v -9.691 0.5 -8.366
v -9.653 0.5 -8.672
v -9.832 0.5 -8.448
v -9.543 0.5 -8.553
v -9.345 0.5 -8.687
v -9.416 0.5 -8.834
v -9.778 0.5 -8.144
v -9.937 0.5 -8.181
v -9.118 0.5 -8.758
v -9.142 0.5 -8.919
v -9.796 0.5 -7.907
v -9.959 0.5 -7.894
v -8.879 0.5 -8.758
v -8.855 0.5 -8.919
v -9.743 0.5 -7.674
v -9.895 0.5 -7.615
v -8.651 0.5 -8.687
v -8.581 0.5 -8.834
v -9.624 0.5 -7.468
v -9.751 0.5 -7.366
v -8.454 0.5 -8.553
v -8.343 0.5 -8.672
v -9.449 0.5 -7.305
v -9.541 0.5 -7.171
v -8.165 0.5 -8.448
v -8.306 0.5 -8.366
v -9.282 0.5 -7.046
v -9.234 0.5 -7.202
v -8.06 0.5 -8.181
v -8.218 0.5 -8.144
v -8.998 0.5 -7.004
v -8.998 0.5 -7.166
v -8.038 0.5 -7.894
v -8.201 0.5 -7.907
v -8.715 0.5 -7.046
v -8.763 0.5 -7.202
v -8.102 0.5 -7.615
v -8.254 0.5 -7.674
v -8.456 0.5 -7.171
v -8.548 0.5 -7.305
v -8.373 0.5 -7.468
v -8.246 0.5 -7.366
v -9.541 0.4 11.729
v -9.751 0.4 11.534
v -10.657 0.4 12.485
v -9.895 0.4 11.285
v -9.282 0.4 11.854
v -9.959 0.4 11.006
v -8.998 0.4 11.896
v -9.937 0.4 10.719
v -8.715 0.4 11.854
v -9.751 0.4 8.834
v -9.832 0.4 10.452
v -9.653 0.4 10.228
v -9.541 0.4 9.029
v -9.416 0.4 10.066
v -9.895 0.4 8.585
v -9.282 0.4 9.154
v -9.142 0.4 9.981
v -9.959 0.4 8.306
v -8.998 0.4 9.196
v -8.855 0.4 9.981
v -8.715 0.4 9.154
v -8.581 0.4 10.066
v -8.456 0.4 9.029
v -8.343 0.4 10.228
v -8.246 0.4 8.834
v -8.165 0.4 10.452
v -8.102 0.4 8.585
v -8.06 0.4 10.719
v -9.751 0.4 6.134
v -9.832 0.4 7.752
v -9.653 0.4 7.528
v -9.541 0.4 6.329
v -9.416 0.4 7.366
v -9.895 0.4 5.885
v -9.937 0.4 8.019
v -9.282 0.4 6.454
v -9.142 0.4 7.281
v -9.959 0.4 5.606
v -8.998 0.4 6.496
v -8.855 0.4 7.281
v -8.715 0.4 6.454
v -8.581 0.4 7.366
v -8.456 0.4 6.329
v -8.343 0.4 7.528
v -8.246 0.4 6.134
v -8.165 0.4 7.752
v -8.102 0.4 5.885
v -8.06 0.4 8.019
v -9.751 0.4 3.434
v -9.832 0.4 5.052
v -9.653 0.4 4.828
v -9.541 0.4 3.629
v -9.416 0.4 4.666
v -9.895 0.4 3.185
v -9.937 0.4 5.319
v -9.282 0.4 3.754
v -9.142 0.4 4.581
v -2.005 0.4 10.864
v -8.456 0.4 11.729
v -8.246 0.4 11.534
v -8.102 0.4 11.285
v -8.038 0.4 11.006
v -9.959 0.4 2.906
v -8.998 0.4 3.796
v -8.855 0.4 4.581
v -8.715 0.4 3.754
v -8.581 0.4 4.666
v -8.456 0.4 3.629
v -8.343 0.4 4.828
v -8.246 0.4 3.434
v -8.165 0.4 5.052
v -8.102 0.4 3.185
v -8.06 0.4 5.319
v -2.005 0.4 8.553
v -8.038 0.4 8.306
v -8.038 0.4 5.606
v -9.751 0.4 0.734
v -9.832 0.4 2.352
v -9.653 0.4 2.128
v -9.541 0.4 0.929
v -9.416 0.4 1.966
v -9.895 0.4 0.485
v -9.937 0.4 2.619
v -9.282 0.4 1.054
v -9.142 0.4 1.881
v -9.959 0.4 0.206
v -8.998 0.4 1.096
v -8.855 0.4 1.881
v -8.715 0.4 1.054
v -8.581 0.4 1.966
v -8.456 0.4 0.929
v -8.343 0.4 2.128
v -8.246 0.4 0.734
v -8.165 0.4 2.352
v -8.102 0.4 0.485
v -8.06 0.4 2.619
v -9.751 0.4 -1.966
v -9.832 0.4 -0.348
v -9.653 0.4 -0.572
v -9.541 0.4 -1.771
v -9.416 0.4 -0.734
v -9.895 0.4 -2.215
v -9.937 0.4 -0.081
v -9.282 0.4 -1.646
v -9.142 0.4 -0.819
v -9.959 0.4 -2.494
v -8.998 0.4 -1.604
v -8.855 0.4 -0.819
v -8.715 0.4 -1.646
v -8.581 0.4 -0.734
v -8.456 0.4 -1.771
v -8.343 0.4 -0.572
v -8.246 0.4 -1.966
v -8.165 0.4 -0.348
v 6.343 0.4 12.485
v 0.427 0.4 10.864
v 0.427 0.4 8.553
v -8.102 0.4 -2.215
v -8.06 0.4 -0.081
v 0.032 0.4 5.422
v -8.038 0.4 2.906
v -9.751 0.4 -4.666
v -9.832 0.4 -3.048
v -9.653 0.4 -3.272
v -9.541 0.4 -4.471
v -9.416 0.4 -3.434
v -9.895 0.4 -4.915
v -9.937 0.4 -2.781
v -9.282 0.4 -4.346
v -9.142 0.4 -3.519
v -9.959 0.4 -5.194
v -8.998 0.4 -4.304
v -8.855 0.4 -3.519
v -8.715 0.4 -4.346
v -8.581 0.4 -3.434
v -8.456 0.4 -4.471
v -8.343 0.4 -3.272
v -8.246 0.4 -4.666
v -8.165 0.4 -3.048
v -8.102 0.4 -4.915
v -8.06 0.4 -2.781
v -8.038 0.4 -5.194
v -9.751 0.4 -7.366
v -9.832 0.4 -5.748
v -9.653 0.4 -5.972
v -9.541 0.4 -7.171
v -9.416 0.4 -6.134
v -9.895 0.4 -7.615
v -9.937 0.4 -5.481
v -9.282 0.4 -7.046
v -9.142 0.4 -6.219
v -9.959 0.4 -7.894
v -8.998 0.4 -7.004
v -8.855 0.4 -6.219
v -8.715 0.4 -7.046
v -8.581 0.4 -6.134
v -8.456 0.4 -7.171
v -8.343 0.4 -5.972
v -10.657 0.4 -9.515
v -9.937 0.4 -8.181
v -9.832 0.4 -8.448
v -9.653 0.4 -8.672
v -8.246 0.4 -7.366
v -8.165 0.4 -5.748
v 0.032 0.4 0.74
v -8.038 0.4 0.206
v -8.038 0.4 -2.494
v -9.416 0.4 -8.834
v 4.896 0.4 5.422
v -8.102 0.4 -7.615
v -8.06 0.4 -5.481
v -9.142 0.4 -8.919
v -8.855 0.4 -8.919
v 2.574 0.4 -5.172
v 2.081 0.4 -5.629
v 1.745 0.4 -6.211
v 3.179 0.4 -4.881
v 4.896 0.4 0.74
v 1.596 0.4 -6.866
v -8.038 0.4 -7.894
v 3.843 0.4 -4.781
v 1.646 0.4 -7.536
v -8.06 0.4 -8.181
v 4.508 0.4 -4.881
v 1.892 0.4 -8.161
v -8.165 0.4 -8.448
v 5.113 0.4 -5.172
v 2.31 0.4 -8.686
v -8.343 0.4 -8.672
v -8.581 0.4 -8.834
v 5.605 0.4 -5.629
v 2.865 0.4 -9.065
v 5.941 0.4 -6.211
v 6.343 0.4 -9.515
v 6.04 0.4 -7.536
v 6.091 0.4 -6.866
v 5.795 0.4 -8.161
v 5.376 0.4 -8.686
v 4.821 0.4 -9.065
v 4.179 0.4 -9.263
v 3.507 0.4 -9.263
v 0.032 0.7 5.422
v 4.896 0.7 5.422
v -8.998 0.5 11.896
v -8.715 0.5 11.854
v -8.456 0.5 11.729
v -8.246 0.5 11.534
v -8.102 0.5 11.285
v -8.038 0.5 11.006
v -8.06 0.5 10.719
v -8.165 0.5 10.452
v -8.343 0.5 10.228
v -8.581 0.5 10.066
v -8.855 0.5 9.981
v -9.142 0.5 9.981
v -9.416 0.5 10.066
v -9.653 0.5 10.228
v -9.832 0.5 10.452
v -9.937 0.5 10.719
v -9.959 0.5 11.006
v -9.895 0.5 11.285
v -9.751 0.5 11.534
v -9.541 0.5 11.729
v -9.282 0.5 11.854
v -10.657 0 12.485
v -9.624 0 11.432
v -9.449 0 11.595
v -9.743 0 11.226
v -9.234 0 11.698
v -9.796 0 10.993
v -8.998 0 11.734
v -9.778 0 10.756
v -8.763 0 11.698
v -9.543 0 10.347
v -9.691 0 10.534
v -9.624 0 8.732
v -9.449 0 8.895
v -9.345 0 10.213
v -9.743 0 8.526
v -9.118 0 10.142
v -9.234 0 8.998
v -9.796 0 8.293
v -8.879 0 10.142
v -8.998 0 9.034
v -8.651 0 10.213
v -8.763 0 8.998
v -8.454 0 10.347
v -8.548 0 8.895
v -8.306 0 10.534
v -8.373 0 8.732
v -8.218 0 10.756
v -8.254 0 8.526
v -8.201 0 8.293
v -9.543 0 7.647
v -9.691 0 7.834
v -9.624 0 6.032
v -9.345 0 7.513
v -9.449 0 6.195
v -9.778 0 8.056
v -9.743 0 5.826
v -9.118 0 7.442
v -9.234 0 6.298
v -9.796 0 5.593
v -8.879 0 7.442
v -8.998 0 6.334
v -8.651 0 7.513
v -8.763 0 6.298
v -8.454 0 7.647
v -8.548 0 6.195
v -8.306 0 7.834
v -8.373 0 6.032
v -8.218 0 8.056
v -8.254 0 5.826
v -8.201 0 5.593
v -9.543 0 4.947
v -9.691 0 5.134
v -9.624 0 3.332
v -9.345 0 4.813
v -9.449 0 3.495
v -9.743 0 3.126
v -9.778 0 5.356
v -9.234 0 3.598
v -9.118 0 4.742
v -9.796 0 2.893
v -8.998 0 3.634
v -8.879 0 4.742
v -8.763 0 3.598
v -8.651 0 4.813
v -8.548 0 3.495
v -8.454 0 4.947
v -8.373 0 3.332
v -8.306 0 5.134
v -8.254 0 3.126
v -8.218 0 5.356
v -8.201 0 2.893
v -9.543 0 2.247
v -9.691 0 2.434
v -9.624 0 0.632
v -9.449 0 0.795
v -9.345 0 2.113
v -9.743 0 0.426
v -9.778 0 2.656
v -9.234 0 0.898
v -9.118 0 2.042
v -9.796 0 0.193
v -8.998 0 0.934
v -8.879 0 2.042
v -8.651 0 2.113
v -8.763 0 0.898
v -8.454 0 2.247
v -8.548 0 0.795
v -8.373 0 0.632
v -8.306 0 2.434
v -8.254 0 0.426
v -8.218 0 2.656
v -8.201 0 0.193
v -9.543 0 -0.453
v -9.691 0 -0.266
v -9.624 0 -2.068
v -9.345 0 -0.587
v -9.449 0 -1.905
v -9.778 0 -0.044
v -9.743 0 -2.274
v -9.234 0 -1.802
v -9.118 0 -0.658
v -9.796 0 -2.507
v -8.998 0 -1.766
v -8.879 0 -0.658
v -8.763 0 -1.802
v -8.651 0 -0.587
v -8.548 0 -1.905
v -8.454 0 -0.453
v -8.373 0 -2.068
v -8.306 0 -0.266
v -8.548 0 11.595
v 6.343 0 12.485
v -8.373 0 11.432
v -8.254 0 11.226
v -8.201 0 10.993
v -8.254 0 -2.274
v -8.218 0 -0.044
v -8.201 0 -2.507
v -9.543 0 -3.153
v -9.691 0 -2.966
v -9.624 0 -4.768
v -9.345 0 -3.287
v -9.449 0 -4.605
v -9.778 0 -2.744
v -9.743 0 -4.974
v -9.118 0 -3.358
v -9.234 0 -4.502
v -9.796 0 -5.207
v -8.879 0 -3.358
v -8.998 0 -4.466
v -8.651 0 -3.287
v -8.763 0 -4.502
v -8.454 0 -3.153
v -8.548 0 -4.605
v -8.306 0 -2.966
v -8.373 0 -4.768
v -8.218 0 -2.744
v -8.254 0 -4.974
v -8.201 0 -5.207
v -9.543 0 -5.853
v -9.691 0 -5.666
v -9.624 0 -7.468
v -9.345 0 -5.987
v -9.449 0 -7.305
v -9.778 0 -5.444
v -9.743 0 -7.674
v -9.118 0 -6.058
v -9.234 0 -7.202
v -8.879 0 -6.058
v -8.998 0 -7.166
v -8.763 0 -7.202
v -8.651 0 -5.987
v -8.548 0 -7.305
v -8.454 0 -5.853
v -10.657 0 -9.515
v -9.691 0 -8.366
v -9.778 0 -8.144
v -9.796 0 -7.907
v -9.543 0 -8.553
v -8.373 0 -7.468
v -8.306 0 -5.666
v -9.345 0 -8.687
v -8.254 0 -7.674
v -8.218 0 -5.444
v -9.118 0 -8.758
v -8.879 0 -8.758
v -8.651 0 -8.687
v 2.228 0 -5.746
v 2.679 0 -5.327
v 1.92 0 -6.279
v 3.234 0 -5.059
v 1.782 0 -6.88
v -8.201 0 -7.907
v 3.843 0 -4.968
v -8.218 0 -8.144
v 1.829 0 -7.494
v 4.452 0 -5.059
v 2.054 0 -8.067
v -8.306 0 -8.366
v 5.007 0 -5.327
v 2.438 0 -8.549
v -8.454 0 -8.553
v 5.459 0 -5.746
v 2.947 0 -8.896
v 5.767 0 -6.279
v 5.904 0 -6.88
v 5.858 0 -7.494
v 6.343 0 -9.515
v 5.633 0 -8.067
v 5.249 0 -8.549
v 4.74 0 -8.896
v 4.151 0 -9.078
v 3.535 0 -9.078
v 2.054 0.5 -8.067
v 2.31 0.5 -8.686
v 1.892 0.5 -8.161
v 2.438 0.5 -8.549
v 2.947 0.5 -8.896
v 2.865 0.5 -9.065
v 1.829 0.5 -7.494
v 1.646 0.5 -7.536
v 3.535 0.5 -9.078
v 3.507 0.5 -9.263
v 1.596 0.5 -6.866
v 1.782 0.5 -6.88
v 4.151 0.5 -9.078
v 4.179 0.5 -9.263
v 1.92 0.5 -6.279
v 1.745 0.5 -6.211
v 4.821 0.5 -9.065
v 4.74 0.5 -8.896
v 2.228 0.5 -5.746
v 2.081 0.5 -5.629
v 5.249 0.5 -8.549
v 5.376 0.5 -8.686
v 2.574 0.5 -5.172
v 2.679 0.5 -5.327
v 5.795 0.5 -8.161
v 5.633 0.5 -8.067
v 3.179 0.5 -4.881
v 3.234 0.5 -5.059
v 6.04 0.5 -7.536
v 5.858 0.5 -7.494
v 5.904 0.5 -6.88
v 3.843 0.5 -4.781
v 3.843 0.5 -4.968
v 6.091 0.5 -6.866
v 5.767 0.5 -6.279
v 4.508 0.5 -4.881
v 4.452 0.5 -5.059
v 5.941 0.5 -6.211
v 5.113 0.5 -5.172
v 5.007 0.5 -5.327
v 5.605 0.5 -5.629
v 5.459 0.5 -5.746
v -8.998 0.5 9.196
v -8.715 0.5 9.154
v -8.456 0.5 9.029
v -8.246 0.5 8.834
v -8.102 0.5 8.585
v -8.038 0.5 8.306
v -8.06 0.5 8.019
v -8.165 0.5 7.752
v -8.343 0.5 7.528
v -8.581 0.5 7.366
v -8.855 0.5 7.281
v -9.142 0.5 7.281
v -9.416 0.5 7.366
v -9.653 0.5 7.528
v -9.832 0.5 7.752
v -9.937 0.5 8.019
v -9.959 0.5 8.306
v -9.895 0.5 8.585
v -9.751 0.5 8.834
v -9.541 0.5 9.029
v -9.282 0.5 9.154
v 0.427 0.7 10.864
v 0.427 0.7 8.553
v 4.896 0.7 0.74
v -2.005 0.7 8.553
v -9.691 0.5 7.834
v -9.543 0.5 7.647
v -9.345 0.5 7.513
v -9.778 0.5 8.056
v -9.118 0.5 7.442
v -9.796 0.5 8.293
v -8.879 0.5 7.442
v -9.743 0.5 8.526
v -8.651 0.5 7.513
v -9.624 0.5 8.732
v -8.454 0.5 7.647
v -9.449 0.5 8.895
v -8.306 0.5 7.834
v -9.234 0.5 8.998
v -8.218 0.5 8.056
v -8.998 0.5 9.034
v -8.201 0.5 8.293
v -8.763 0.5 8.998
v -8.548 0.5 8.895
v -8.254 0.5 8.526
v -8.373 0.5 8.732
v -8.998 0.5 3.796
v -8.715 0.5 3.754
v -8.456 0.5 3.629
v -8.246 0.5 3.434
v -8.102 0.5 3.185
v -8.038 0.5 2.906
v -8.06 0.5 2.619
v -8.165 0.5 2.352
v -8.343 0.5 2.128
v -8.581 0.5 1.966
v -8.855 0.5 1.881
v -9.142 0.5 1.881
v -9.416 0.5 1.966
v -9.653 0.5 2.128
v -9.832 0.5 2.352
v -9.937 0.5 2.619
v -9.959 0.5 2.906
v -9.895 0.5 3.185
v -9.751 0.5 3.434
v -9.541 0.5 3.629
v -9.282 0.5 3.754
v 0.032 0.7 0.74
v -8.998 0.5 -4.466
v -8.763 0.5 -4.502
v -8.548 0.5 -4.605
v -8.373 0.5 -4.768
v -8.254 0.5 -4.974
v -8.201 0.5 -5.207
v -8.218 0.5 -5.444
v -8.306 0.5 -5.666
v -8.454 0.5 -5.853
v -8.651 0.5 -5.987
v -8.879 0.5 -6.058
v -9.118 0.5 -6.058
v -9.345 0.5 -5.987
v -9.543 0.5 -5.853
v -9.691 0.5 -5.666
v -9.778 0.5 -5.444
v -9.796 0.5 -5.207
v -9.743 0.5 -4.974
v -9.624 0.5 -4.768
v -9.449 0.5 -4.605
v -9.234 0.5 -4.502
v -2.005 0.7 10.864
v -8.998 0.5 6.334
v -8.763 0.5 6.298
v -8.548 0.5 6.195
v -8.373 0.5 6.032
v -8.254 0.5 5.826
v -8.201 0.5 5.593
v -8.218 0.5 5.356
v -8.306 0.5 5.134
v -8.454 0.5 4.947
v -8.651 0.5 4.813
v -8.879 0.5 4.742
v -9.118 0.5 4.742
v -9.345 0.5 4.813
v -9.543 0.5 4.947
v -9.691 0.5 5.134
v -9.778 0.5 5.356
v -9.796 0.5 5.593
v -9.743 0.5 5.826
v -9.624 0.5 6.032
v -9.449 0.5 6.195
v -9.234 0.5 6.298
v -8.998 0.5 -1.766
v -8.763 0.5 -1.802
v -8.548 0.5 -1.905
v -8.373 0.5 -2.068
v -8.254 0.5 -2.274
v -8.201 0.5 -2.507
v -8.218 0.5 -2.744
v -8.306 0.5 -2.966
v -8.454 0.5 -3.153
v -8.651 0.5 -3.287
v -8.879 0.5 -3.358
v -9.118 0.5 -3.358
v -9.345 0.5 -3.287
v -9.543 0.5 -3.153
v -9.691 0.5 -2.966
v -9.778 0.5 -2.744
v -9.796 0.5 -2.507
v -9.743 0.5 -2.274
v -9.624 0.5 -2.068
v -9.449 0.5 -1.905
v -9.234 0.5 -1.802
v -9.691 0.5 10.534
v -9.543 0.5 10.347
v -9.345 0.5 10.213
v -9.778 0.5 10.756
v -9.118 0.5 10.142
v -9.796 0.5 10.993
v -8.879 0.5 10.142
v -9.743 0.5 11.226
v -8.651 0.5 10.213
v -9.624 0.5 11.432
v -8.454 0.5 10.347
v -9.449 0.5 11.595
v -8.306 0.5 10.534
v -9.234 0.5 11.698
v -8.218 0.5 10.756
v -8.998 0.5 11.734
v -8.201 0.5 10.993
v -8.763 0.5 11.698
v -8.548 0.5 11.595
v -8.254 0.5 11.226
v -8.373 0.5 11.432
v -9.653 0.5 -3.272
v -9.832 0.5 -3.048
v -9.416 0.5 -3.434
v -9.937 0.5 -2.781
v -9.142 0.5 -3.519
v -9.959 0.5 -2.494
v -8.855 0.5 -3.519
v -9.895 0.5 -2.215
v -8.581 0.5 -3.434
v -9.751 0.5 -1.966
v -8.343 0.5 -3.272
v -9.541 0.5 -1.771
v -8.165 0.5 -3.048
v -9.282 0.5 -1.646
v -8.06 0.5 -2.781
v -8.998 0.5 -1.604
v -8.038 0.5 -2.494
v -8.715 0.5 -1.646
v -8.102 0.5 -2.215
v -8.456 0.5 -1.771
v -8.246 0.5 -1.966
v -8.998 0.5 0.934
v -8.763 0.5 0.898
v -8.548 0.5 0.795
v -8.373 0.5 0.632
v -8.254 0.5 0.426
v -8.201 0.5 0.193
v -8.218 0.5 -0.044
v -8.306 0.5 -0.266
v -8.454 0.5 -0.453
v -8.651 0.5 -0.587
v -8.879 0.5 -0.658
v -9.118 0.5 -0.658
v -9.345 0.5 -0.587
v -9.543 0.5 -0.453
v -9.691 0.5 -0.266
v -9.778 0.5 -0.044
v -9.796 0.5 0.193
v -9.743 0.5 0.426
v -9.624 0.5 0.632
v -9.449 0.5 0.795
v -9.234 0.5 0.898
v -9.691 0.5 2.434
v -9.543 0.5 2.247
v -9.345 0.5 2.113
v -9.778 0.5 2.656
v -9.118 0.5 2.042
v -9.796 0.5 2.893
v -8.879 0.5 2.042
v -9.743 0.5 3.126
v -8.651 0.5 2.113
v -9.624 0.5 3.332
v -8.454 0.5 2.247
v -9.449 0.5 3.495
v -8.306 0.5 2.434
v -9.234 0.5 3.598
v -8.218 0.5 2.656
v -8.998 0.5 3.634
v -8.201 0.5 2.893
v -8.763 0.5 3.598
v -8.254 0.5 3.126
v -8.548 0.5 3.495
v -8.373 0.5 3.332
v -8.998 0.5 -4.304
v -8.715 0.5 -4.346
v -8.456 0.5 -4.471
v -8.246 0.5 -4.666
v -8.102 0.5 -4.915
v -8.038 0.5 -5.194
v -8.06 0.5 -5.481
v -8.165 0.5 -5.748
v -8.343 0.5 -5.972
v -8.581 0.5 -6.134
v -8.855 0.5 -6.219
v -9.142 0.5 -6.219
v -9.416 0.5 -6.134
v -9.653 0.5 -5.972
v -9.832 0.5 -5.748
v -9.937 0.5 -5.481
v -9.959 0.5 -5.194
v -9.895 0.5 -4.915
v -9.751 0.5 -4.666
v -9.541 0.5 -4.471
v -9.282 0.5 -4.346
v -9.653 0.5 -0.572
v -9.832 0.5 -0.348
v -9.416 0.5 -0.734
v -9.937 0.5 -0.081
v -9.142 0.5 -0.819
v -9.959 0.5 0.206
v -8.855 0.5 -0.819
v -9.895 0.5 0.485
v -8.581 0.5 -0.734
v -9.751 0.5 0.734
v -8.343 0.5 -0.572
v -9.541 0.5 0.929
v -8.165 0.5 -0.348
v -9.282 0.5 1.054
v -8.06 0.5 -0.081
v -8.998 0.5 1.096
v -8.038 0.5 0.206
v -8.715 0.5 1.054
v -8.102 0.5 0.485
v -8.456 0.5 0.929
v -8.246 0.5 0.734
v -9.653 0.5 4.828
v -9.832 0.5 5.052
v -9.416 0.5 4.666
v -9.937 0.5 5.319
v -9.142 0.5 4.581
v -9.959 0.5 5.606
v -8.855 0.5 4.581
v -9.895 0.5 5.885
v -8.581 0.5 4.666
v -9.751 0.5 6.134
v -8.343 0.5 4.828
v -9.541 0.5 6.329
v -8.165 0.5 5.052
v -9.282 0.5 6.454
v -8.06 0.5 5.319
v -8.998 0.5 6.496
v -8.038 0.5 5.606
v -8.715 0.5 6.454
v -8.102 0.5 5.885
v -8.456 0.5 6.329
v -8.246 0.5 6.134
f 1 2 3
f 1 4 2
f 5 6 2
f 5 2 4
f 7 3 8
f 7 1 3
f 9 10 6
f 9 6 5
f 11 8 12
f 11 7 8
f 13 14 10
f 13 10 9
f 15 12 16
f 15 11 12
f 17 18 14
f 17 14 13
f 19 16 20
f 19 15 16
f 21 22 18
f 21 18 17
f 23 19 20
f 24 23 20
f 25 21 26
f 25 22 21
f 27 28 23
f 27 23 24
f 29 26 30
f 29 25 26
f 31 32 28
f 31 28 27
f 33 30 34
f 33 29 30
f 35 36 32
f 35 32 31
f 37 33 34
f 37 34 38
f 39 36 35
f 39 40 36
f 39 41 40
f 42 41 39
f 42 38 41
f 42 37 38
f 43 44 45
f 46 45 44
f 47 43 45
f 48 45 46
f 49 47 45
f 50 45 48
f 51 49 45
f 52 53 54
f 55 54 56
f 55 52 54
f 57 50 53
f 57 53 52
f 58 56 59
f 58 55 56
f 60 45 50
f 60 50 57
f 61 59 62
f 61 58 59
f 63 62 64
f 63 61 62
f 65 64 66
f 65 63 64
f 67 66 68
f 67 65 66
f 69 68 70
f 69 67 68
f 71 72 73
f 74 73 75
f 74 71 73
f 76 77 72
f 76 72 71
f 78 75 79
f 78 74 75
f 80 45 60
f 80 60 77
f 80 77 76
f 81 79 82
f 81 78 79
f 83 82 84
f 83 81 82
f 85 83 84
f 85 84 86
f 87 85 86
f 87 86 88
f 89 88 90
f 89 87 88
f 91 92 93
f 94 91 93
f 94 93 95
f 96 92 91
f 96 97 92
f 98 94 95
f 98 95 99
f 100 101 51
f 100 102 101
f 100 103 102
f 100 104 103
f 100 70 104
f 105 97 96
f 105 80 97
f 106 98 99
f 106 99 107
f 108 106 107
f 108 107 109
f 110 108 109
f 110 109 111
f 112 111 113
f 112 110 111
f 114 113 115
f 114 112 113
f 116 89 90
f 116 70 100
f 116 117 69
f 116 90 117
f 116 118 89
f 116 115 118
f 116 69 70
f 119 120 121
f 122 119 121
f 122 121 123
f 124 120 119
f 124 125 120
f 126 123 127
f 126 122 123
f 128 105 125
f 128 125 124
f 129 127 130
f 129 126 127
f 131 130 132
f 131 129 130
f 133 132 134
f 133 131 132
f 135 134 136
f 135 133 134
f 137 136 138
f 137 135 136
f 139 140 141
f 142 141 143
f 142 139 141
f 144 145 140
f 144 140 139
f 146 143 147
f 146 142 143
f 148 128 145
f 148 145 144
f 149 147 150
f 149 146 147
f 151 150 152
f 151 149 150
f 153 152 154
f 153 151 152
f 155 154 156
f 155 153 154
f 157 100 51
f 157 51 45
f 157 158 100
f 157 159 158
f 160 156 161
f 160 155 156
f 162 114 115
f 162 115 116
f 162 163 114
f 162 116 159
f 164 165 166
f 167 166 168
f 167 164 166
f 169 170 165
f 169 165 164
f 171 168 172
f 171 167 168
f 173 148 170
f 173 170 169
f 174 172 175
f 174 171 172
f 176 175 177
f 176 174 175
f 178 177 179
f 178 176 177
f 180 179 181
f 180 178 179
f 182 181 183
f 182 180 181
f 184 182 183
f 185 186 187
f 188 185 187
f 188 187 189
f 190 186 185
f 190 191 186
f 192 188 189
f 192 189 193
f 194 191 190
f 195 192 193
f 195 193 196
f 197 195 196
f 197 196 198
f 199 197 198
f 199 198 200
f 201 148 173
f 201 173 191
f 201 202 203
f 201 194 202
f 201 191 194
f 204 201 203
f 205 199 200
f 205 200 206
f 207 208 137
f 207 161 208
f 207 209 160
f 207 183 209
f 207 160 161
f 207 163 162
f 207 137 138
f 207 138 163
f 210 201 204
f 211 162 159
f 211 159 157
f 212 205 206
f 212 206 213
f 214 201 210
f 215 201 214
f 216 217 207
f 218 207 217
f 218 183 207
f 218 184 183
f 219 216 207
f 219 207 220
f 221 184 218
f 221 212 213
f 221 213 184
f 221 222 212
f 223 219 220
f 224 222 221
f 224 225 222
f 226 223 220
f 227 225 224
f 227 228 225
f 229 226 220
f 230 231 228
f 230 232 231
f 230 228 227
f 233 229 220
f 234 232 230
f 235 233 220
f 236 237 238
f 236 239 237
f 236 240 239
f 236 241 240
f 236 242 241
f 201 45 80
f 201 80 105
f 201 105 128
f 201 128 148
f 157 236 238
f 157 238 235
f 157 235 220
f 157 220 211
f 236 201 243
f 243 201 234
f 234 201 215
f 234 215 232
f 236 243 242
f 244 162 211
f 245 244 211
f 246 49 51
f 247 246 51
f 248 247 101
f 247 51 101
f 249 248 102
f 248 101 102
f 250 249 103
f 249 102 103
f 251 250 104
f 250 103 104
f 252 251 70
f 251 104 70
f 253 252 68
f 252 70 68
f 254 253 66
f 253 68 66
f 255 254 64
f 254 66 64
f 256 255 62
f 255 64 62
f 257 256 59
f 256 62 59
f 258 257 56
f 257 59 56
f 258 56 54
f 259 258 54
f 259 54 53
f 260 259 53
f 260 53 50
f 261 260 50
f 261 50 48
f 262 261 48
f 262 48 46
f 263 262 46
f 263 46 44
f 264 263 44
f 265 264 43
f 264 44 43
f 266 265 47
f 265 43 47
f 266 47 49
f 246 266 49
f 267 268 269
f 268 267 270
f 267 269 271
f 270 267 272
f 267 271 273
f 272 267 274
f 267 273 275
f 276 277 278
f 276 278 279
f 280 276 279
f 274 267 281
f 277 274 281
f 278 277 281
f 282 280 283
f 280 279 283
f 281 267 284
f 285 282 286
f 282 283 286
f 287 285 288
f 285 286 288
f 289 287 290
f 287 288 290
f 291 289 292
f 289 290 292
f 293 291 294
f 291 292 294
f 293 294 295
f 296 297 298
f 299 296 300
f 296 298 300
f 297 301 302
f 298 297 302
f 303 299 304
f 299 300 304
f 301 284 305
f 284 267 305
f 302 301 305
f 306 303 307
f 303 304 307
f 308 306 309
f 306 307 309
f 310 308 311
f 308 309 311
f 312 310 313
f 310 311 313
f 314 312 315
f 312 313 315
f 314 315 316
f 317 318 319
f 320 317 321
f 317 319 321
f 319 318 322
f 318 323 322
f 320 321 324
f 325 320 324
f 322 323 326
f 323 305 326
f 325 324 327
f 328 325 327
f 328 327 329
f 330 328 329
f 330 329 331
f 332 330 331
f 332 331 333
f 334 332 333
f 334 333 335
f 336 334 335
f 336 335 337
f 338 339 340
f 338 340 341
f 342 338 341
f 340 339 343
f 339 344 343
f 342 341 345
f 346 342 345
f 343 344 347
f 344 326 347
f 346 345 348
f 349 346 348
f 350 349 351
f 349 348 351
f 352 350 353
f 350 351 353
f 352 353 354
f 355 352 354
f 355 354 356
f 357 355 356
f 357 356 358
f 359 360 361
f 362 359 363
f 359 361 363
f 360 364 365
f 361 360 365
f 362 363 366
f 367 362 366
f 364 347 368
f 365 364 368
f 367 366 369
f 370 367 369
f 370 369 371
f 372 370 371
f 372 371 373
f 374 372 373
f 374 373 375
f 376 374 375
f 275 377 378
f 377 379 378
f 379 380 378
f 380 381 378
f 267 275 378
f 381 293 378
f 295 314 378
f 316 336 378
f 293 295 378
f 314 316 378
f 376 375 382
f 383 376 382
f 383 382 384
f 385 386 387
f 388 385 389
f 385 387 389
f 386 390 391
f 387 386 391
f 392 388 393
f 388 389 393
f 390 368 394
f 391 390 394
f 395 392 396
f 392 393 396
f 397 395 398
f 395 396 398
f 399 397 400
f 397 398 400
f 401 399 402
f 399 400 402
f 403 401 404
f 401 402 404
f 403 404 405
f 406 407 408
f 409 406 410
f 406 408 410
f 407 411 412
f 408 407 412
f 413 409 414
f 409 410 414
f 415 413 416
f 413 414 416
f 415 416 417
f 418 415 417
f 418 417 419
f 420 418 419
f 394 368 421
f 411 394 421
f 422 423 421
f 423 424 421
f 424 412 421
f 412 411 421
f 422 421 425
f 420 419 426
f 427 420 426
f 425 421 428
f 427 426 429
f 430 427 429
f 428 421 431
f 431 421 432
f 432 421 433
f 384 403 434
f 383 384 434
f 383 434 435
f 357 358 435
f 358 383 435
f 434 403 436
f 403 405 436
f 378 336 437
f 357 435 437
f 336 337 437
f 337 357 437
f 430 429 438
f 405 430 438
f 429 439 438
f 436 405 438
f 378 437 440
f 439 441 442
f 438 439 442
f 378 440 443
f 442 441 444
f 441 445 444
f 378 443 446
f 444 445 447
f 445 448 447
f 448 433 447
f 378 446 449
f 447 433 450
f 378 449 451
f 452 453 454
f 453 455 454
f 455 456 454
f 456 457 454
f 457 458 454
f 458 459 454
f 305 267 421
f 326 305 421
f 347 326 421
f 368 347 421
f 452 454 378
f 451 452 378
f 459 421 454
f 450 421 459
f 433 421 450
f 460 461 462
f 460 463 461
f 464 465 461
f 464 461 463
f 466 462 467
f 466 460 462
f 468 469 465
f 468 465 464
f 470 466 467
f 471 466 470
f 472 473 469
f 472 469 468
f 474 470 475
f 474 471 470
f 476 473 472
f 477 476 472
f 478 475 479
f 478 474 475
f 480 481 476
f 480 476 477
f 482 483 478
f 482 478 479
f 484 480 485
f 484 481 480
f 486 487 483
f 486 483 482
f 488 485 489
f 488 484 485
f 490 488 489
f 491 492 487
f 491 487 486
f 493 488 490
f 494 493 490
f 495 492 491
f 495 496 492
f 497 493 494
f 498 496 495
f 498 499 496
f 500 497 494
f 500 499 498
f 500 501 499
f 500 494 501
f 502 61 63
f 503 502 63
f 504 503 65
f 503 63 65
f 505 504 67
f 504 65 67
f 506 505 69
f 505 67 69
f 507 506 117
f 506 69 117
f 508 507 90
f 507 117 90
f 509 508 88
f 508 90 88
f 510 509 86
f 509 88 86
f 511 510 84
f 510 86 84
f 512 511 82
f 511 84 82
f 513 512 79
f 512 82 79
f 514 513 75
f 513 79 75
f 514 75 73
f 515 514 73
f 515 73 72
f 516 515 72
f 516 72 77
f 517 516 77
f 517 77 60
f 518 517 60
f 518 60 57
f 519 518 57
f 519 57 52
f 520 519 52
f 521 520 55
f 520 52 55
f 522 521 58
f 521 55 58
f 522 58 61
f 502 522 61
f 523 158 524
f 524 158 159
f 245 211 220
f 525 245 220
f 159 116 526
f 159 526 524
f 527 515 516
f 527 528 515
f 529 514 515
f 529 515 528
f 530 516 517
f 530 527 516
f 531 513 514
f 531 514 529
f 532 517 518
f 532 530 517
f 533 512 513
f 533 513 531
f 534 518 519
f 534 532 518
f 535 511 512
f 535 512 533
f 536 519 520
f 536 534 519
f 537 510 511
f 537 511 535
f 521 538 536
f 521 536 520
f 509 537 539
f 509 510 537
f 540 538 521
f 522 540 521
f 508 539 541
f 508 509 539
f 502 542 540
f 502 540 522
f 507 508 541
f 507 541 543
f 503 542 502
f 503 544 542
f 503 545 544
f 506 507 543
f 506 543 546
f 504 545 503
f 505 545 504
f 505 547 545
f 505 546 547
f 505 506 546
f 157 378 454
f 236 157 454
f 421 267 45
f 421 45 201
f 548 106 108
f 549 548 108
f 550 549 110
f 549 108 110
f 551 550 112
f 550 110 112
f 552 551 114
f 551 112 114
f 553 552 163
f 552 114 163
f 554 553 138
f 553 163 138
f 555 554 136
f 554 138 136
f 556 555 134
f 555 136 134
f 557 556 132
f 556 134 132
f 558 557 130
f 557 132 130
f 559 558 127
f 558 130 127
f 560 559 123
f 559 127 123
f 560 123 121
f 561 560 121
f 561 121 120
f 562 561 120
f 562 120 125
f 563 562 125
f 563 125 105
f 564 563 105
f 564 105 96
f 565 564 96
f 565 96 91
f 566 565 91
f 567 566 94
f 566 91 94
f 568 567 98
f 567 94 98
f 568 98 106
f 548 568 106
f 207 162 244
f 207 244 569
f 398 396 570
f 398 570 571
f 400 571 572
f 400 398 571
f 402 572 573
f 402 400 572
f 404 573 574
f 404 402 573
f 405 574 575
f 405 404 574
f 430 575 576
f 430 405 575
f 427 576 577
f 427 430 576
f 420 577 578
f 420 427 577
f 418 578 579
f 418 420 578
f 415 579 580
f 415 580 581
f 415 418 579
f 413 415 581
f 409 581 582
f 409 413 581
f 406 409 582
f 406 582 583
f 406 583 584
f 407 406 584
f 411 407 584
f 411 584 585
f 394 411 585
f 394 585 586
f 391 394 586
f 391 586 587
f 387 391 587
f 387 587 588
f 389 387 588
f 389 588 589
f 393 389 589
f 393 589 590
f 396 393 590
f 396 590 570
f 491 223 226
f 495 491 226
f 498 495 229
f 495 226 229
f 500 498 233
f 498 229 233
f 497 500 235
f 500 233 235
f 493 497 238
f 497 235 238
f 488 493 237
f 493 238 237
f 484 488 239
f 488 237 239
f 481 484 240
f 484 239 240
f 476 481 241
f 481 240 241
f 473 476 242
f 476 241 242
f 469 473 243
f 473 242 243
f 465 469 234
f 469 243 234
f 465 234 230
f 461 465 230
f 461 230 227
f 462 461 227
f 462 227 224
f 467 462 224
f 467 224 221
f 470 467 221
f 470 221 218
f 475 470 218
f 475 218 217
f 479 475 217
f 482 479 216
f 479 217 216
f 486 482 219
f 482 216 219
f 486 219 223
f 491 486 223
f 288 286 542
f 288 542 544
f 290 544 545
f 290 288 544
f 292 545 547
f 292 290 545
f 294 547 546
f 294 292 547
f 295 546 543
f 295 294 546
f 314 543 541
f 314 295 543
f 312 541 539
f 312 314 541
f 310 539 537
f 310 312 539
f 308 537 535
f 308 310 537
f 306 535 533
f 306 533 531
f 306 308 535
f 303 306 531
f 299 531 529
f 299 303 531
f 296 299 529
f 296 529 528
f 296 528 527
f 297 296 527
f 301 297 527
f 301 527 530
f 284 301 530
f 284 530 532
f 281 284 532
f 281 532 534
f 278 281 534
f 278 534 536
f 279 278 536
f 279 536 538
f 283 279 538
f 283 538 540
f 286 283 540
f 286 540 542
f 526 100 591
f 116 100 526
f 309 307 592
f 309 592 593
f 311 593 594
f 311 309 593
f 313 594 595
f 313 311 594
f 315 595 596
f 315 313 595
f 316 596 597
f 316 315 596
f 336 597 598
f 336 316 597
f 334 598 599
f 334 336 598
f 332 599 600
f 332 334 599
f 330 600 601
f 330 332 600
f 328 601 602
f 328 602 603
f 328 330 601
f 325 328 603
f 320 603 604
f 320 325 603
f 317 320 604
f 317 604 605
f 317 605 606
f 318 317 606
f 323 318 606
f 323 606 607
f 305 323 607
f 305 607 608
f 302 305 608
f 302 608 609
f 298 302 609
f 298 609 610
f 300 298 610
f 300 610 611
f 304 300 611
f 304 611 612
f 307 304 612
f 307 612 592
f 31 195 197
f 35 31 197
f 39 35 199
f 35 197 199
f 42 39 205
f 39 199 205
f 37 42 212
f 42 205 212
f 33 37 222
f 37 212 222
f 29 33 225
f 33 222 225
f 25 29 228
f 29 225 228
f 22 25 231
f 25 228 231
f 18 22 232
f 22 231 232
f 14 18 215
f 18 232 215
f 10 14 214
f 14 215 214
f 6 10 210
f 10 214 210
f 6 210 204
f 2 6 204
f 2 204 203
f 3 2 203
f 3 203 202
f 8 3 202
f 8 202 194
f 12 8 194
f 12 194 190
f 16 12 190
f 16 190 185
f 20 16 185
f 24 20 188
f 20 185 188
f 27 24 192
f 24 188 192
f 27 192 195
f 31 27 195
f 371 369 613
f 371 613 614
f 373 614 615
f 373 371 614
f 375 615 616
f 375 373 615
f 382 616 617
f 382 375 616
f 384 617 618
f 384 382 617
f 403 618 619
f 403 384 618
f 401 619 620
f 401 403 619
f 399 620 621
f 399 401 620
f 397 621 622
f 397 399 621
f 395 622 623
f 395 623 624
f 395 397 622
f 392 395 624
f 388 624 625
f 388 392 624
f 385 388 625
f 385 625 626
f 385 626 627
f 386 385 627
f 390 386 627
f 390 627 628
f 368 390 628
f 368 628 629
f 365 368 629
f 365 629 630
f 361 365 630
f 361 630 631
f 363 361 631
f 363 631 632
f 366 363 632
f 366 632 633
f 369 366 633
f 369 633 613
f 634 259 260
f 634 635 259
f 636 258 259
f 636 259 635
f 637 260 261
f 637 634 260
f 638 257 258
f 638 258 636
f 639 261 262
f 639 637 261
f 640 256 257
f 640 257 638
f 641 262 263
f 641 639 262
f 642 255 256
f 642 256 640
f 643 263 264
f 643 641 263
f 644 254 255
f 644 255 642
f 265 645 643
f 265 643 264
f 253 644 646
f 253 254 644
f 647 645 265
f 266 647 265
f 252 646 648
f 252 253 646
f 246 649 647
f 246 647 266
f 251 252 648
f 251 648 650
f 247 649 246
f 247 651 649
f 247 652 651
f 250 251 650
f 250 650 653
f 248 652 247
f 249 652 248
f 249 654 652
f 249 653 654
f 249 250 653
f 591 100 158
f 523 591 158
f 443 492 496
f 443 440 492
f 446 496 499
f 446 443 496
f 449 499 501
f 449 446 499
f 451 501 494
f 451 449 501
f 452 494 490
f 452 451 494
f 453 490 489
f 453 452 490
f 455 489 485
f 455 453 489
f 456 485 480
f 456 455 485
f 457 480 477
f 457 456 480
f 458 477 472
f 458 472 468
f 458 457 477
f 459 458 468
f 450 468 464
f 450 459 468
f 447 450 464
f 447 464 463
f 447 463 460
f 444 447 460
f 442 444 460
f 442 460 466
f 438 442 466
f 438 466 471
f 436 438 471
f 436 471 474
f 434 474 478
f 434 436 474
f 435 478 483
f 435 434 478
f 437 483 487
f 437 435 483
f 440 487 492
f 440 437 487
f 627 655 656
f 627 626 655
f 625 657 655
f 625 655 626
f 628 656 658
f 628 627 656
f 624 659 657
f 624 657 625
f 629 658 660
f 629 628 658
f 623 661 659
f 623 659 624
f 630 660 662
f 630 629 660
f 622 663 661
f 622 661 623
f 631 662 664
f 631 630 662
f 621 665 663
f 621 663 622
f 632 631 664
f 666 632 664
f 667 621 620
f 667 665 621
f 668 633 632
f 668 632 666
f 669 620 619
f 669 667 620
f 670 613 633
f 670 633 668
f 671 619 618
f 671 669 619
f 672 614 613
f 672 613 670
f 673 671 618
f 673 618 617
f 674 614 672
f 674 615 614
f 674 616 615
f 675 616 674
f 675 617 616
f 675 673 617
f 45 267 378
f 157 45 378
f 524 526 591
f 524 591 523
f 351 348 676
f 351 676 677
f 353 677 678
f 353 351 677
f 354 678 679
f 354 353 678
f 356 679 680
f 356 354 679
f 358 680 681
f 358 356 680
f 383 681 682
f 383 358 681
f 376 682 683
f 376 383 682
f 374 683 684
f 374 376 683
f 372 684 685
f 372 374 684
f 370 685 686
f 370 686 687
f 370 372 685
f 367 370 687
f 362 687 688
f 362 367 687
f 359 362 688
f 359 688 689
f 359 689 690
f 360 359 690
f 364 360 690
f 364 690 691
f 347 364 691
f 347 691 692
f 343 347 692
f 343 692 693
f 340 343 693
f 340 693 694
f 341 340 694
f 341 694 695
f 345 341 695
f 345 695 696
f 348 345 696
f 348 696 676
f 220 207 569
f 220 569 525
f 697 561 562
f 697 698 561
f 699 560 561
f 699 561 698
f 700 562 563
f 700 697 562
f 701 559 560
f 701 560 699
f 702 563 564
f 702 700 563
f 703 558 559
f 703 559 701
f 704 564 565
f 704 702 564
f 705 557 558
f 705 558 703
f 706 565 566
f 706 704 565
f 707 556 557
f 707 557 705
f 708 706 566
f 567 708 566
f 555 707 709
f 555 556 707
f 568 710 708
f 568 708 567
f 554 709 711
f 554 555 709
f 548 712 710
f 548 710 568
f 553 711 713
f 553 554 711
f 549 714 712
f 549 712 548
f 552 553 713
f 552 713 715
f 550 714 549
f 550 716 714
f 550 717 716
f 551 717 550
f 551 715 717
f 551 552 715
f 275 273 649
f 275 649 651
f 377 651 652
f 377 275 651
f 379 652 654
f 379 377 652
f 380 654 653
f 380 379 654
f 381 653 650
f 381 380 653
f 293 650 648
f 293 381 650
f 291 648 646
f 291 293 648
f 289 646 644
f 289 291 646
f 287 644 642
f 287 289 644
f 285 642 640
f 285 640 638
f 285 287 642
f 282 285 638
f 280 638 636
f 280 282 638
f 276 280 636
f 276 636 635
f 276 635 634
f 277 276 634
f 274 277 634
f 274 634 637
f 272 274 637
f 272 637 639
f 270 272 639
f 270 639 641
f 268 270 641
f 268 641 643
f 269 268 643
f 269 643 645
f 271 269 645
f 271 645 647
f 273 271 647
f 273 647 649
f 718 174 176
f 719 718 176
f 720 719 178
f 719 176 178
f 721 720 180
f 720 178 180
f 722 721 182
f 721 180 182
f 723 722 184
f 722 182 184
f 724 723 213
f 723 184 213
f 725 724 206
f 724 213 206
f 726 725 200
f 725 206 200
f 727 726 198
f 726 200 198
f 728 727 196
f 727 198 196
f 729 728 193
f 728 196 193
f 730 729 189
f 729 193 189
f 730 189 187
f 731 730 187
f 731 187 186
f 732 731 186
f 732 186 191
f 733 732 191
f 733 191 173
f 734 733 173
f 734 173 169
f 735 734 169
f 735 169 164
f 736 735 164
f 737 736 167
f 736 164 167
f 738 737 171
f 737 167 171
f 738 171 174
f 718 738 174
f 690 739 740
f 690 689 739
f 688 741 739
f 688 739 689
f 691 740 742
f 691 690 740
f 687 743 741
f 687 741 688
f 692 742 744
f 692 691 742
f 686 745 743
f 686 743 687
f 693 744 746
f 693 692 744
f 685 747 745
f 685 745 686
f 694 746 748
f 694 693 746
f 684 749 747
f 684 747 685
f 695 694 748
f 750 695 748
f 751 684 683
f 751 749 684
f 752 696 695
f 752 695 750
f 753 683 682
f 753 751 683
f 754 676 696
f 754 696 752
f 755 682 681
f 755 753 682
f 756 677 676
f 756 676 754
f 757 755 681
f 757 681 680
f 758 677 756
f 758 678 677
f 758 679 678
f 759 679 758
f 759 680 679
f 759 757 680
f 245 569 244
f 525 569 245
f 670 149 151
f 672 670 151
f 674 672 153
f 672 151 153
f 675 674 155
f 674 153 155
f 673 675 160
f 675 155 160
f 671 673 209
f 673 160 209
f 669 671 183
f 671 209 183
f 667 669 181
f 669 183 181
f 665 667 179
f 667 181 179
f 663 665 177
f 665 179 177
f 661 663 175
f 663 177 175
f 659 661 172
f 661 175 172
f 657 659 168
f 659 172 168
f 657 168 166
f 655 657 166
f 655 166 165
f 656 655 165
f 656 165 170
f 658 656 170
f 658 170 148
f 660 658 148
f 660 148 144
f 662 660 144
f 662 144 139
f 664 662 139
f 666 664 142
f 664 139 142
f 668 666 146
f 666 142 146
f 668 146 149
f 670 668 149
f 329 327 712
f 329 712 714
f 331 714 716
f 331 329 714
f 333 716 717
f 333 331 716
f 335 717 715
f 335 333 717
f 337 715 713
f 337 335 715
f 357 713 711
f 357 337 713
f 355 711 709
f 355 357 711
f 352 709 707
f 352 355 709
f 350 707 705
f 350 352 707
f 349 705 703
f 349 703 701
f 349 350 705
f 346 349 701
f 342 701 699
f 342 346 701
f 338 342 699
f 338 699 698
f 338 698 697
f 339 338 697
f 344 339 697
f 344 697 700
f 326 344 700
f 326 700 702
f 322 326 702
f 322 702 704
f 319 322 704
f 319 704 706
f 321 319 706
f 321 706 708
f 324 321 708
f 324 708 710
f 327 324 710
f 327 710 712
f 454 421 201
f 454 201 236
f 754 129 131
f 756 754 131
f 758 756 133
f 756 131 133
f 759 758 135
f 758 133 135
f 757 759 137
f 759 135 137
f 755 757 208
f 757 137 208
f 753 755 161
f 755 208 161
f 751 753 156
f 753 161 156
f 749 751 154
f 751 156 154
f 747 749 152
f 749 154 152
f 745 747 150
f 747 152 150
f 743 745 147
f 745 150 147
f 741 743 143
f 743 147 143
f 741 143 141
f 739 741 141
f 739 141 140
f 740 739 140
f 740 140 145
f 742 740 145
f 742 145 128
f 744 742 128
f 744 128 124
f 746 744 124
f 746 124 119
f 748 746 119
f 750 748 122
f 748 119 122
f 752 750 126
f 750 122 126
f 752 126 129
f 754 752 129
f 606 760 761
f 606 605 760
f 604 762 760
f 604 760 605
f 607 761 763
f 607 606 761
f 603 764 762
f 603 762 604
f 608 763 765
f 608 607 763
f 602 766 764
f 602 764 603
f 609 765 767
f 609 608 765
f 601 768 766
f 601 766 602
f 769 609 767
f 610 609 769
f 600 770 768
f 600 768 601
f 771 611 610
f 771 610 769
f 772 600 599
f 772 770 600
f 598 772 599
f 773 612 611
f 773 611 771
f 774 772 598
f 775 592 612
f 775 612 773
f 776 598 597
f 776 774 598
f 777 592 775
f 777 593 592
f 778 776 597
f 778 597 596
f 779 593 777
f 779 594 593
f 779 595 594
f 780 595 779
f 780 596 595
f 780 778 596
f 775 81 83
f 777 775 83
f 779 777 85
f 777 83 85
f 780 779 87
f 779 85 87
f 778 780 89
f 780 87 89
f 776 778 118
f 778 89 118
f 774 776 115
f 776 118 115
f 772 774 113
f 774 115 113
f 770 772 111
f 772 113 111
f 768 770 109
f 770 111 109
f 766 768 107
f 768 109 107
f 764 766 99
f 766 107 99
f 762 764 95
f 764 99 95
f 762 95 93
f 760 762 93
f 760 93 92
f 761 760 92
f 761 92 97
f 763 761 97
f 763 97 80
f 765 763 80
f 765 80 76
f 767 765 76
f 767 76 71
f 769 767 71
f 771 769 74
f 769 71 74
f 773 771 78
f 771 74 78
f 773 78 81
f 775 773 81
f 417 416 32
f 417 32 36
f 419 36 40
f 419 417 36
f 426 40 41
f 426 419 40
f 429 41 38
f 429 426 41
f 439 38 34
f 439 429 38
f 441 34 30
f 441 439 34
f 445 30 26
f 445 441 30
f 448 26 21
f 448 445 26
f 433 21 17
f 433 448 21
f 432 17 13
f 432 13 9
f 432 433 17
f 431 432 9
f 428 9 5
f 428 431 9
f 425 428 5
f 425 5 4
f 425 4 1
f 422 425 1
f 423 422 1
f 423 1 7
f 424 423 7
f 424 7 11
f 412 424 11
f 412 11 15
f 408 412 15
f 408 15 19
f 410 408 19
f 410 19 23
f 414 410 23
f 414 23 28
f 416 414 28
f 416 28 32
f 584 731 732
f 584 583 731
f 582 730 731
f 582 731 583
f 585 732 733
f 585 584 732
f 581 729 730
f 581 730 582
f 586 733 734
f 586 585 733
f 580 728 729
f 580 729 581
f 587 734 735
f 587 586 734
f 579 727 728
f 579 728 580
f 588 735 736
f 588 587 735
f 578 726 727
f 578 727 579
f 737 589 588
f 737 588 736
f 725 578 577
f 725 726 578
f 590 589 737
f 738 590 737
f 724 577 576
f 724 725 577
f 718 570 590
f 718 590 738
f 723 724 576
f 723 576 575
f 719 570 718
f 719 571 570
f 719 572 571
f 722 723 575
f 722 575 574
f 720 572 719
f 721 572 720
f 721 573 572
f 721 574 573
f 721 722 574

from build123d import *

# Parameters (mm, degrees)
SKETCH1_W           = 17
SKETCH1_H           = 22
SKETCH1_R           = 2.066566425
SKETCH1_R_2         = 0.8
BOSS_EXTRUDE2_DEPTH = 0.4
SKETCH3_R           = 2.253615782
SKETCH3_R_2         = 2.066566425
SKETCH3_R_3         = 0.962856641
SKETCH3_R_4         = 0.8
BOSS_EXTRUDE3_DEPTH = 0.1
SKETCH4_W           = 2.432070337
SKETCH4_H           = 2.310466819
SKETCH4_W_2         = 4.864140673
SKETCH4_H_2         = 4.681735398
BOSS_EXTRUDE4_DEPTH = 0.3


with BuildPart() as part:
    # Sketch1 → Boss-Extrude2 (new body)
    with BuildSketch(Plane(origin=(0, 0, 0), x_dir=(1, 0, 0), z_dir=(0, 1, 0))):
        with Locations((-2.156716418, -1.485074627)):
            Rectangle(SKETCH1_W, SKETCH1_H)
        with Locations(Location((3.843283582, 7.034200162, 0), (0, 0, 270))):
            Circle(SKETCH1_R, mode=Mode.SUBTRACT)
        with Locations(Location((-8.998366841, 7.966442948, 0), (0, 0, 270))):
            Circle(SKETCH1_R_2, mode=Mode.SUBTRACT)
        with Locations(Location((-8.998366841, 5.266442948, 0), (0, 0, 270))):
            Circle(SKETCH1_R_2, mode=Mode.SUBTRACT)
        with Locations(Location((-8.998366841, 2.566442948, 0), (0, 0, 270))):
            Circle(SKETCH1_R_2, mode=Mode.SUBTRACT)
        with Locations(Location((-8.998366841, -0.133557052, 0), (0, 0, 270))):
            Circle(SKETCH1_R_2, mode=Mode.SUBTRACT)
        with Locations(Location((-8.998366841, -2.833557052, 0), (0, 0, 270))):
            Circle(SKETCH1_R_2, mode=Mode.SUBTRACT)
        with Locations(Location((-8.998366841, -5.533557052, 0), (0, 0, 270))):
            Circle(SKETCH1_R_2, mode=Mode.SUBTRACT)
        with Locations(Location((-8.998366841, -8.233557052, 0), (0, 0, 270))):
            Circle(SKETCH1_R_2, mode=Mode.SUBTRACT)
        with Locations(Location((-8.998366841, -10.933557052, 0), (0, 0, 270))):
            Circle(SKETCH1_R_2, mode=Mode.SUBTRACT)
    extrude(amount=BOSS_EXTRUDE2_DEPTH)

    # Sketch3 → Boss-Extrude3 (add)
    # profile 1 of 9: a face of its own
    with BuildSketch(Plane(origin=(0, 0.4, 0), x_dir=(1, 0, 0), z_dir=(0, 1, 0))):
        with Locations(Location((3.843283582, 7.034200162, 0), (0, 0, 270))):
            Circle(SKETCH3_R)
        with Locations(Location((3.843283582, 7.034200162, 0), (0, 0, 270))):
            Circle(SKETCH3_R_2, mode=Mode.SUBTRACT)
    # profile 2 of 9: a face of its own
    with BuildSketch(Plane(origin=(0, 0.4, 0), x_dir=(1, 0, 0), z_dir=(0, 1, 0))):
        with Locations(Location((-8.998366841, 7.966442948, 0), (0, 0, 270))):
            Circle(SKETCH3_R_3)
        with Locations(Location((-8.998366841, 7.966442948, 0), (0, 0, 270))):
            Circle(SKETCH3_R_4, mode=Mode.SUBTRACT)
    # profile 3 of 9: a face of its own
    with BuildSketch(Plane(origin=(0, 0.4, 0), x_dir=(1, 0, 0), z_dir=(0, 1, 0))):
        with Locations(Location((-8.998366841, 5.266442948, 0), (0, 0, 270))):
            Circle(SKETCH3_R_3)
        with Locations(Location((-8.998366841, 5.266442948, 0), (0, 0, 270))):
            Circle(SKETCH3_R_4, mode=Mode.SUBTRACT)
    # profile 4 of 9: a face of its own
    with BuildSketch(Plane(origin=(0, 0.4, 0), x_dir=(1, 0, 0), z_dir=(0, 1, 0))):
        with Locations(Location((-8.998366841, 2.566442948, 0), (0, 0, 270))):
            Circle(SKETCH3_R_3)
        with Locations(Location((-8.998366841, 2.566442948, 0), (0, 0, 270))):
            Circle(SKETCH3_R_4, mode=Mode.SUBTRACT)
    # profile 5 of 9: a face of its own
    with BuildSketch(Plane(origin=(0, 0.4, 0), x_dir=(1, 0, 0), z_dir=(0, 1, 0))):
        with Locations(Location((-8.998366841, -0.133557052, 0), (0, 0, 270))):
            Circle(SKETCH3_R_3)
        with Locations(Location((-8.998366841, -0.133557052, 0), (0, 0, 270))):
            Circle(SKETCH3_R_4, mode=Mode.SUBTRACT)
    # profile 6 of 9: a face of its own
    with BuildSketch(Plane(origin=(0, 0.4, 0), x_dir=(1, 0, 0), z_dir=(0, 1, 0))):
        with Locations(Location((-8.998366841, -2.833557052, 0), (0, 0, 270))):
            Circle(SKETCH3_R_3)
        with Locations(Location((-8.998366841, -2.833557052, 0), (0, 0, 270))):
            Circle(SKETCH3_R_4, mode=Mode.SUBTRACT)
    # profile 7 of 9: a face of its own
    with BuildSketch(Plane(origin=(0, 0.4, 0), x_dir=(1, 0, 0), z_dir=(0, 1, 0))):
        with Locations(Location((-8.998366841, -5.533557052, 0), (0, 0, 270))):
            Circle(SKETCH3_R_3)
        with Locations(Location((-8.998366841, -5.533557052, 0), (0, 0, 270))):
            Circle(SKETCH3_R_4, mode=Mode.SUBTRACT)
    # profile 8 of 9: a face of its own
    with BuildSketch(Plane(origin=(0, 0.4, 0), x_dir=(1, 0, 0), z_dir=(0, 1, 0))):
        with Locations(Location((-8.998366841, -8.233557052, 0), (0, 0, 270))):
            Circle(SKETCH3_R_3)
        with Locations(Location((-8.998366841, -8.233557052, 0), (0, 0, 270))):
            Circle(SKETCH3_R_4, mode=Mode.SUBTRACT)
    # profile 9 of 9: a face of its own
    with BuildSketch(Plane(origin=(0, 0.4, 0), x_dir=(1, 0, 0), z_dir=(0, 1, 0))):
        with Locations(Location((-8.998366841, -10.933557052, 0), (0, 0, 270))):
            Circle(SKETCH3_R_3)
        with Locations(Location((-8.998366841, -10.933557052, 0), (0, 0, 270))):
            Circle(SKETCH3_R_4, mode=Mode.SUBTRACT)
    extrude(amount=BOSS_EXTRUDE3_DEPTH)

    # Sketch4 → Boss-Extrude4 (add)
    with BuildSketch(Plane(origin=(0, 0.4, 0), x_dir=(1, 0, 0), z_dir=(0, 1, 0))):
        with Locations((-0.788676854, -9.708512452)):
            Rectangle(SKETCH4_W, SKETCH4_H)
        with Locations((2.464217222, -3.081120785)):
            Rectangle(SKETCH4_W_2, SKETCH4_H_2)
    extrude(amount=BOSS_EXTRUDE4_DEPTH)


solid = part.part
